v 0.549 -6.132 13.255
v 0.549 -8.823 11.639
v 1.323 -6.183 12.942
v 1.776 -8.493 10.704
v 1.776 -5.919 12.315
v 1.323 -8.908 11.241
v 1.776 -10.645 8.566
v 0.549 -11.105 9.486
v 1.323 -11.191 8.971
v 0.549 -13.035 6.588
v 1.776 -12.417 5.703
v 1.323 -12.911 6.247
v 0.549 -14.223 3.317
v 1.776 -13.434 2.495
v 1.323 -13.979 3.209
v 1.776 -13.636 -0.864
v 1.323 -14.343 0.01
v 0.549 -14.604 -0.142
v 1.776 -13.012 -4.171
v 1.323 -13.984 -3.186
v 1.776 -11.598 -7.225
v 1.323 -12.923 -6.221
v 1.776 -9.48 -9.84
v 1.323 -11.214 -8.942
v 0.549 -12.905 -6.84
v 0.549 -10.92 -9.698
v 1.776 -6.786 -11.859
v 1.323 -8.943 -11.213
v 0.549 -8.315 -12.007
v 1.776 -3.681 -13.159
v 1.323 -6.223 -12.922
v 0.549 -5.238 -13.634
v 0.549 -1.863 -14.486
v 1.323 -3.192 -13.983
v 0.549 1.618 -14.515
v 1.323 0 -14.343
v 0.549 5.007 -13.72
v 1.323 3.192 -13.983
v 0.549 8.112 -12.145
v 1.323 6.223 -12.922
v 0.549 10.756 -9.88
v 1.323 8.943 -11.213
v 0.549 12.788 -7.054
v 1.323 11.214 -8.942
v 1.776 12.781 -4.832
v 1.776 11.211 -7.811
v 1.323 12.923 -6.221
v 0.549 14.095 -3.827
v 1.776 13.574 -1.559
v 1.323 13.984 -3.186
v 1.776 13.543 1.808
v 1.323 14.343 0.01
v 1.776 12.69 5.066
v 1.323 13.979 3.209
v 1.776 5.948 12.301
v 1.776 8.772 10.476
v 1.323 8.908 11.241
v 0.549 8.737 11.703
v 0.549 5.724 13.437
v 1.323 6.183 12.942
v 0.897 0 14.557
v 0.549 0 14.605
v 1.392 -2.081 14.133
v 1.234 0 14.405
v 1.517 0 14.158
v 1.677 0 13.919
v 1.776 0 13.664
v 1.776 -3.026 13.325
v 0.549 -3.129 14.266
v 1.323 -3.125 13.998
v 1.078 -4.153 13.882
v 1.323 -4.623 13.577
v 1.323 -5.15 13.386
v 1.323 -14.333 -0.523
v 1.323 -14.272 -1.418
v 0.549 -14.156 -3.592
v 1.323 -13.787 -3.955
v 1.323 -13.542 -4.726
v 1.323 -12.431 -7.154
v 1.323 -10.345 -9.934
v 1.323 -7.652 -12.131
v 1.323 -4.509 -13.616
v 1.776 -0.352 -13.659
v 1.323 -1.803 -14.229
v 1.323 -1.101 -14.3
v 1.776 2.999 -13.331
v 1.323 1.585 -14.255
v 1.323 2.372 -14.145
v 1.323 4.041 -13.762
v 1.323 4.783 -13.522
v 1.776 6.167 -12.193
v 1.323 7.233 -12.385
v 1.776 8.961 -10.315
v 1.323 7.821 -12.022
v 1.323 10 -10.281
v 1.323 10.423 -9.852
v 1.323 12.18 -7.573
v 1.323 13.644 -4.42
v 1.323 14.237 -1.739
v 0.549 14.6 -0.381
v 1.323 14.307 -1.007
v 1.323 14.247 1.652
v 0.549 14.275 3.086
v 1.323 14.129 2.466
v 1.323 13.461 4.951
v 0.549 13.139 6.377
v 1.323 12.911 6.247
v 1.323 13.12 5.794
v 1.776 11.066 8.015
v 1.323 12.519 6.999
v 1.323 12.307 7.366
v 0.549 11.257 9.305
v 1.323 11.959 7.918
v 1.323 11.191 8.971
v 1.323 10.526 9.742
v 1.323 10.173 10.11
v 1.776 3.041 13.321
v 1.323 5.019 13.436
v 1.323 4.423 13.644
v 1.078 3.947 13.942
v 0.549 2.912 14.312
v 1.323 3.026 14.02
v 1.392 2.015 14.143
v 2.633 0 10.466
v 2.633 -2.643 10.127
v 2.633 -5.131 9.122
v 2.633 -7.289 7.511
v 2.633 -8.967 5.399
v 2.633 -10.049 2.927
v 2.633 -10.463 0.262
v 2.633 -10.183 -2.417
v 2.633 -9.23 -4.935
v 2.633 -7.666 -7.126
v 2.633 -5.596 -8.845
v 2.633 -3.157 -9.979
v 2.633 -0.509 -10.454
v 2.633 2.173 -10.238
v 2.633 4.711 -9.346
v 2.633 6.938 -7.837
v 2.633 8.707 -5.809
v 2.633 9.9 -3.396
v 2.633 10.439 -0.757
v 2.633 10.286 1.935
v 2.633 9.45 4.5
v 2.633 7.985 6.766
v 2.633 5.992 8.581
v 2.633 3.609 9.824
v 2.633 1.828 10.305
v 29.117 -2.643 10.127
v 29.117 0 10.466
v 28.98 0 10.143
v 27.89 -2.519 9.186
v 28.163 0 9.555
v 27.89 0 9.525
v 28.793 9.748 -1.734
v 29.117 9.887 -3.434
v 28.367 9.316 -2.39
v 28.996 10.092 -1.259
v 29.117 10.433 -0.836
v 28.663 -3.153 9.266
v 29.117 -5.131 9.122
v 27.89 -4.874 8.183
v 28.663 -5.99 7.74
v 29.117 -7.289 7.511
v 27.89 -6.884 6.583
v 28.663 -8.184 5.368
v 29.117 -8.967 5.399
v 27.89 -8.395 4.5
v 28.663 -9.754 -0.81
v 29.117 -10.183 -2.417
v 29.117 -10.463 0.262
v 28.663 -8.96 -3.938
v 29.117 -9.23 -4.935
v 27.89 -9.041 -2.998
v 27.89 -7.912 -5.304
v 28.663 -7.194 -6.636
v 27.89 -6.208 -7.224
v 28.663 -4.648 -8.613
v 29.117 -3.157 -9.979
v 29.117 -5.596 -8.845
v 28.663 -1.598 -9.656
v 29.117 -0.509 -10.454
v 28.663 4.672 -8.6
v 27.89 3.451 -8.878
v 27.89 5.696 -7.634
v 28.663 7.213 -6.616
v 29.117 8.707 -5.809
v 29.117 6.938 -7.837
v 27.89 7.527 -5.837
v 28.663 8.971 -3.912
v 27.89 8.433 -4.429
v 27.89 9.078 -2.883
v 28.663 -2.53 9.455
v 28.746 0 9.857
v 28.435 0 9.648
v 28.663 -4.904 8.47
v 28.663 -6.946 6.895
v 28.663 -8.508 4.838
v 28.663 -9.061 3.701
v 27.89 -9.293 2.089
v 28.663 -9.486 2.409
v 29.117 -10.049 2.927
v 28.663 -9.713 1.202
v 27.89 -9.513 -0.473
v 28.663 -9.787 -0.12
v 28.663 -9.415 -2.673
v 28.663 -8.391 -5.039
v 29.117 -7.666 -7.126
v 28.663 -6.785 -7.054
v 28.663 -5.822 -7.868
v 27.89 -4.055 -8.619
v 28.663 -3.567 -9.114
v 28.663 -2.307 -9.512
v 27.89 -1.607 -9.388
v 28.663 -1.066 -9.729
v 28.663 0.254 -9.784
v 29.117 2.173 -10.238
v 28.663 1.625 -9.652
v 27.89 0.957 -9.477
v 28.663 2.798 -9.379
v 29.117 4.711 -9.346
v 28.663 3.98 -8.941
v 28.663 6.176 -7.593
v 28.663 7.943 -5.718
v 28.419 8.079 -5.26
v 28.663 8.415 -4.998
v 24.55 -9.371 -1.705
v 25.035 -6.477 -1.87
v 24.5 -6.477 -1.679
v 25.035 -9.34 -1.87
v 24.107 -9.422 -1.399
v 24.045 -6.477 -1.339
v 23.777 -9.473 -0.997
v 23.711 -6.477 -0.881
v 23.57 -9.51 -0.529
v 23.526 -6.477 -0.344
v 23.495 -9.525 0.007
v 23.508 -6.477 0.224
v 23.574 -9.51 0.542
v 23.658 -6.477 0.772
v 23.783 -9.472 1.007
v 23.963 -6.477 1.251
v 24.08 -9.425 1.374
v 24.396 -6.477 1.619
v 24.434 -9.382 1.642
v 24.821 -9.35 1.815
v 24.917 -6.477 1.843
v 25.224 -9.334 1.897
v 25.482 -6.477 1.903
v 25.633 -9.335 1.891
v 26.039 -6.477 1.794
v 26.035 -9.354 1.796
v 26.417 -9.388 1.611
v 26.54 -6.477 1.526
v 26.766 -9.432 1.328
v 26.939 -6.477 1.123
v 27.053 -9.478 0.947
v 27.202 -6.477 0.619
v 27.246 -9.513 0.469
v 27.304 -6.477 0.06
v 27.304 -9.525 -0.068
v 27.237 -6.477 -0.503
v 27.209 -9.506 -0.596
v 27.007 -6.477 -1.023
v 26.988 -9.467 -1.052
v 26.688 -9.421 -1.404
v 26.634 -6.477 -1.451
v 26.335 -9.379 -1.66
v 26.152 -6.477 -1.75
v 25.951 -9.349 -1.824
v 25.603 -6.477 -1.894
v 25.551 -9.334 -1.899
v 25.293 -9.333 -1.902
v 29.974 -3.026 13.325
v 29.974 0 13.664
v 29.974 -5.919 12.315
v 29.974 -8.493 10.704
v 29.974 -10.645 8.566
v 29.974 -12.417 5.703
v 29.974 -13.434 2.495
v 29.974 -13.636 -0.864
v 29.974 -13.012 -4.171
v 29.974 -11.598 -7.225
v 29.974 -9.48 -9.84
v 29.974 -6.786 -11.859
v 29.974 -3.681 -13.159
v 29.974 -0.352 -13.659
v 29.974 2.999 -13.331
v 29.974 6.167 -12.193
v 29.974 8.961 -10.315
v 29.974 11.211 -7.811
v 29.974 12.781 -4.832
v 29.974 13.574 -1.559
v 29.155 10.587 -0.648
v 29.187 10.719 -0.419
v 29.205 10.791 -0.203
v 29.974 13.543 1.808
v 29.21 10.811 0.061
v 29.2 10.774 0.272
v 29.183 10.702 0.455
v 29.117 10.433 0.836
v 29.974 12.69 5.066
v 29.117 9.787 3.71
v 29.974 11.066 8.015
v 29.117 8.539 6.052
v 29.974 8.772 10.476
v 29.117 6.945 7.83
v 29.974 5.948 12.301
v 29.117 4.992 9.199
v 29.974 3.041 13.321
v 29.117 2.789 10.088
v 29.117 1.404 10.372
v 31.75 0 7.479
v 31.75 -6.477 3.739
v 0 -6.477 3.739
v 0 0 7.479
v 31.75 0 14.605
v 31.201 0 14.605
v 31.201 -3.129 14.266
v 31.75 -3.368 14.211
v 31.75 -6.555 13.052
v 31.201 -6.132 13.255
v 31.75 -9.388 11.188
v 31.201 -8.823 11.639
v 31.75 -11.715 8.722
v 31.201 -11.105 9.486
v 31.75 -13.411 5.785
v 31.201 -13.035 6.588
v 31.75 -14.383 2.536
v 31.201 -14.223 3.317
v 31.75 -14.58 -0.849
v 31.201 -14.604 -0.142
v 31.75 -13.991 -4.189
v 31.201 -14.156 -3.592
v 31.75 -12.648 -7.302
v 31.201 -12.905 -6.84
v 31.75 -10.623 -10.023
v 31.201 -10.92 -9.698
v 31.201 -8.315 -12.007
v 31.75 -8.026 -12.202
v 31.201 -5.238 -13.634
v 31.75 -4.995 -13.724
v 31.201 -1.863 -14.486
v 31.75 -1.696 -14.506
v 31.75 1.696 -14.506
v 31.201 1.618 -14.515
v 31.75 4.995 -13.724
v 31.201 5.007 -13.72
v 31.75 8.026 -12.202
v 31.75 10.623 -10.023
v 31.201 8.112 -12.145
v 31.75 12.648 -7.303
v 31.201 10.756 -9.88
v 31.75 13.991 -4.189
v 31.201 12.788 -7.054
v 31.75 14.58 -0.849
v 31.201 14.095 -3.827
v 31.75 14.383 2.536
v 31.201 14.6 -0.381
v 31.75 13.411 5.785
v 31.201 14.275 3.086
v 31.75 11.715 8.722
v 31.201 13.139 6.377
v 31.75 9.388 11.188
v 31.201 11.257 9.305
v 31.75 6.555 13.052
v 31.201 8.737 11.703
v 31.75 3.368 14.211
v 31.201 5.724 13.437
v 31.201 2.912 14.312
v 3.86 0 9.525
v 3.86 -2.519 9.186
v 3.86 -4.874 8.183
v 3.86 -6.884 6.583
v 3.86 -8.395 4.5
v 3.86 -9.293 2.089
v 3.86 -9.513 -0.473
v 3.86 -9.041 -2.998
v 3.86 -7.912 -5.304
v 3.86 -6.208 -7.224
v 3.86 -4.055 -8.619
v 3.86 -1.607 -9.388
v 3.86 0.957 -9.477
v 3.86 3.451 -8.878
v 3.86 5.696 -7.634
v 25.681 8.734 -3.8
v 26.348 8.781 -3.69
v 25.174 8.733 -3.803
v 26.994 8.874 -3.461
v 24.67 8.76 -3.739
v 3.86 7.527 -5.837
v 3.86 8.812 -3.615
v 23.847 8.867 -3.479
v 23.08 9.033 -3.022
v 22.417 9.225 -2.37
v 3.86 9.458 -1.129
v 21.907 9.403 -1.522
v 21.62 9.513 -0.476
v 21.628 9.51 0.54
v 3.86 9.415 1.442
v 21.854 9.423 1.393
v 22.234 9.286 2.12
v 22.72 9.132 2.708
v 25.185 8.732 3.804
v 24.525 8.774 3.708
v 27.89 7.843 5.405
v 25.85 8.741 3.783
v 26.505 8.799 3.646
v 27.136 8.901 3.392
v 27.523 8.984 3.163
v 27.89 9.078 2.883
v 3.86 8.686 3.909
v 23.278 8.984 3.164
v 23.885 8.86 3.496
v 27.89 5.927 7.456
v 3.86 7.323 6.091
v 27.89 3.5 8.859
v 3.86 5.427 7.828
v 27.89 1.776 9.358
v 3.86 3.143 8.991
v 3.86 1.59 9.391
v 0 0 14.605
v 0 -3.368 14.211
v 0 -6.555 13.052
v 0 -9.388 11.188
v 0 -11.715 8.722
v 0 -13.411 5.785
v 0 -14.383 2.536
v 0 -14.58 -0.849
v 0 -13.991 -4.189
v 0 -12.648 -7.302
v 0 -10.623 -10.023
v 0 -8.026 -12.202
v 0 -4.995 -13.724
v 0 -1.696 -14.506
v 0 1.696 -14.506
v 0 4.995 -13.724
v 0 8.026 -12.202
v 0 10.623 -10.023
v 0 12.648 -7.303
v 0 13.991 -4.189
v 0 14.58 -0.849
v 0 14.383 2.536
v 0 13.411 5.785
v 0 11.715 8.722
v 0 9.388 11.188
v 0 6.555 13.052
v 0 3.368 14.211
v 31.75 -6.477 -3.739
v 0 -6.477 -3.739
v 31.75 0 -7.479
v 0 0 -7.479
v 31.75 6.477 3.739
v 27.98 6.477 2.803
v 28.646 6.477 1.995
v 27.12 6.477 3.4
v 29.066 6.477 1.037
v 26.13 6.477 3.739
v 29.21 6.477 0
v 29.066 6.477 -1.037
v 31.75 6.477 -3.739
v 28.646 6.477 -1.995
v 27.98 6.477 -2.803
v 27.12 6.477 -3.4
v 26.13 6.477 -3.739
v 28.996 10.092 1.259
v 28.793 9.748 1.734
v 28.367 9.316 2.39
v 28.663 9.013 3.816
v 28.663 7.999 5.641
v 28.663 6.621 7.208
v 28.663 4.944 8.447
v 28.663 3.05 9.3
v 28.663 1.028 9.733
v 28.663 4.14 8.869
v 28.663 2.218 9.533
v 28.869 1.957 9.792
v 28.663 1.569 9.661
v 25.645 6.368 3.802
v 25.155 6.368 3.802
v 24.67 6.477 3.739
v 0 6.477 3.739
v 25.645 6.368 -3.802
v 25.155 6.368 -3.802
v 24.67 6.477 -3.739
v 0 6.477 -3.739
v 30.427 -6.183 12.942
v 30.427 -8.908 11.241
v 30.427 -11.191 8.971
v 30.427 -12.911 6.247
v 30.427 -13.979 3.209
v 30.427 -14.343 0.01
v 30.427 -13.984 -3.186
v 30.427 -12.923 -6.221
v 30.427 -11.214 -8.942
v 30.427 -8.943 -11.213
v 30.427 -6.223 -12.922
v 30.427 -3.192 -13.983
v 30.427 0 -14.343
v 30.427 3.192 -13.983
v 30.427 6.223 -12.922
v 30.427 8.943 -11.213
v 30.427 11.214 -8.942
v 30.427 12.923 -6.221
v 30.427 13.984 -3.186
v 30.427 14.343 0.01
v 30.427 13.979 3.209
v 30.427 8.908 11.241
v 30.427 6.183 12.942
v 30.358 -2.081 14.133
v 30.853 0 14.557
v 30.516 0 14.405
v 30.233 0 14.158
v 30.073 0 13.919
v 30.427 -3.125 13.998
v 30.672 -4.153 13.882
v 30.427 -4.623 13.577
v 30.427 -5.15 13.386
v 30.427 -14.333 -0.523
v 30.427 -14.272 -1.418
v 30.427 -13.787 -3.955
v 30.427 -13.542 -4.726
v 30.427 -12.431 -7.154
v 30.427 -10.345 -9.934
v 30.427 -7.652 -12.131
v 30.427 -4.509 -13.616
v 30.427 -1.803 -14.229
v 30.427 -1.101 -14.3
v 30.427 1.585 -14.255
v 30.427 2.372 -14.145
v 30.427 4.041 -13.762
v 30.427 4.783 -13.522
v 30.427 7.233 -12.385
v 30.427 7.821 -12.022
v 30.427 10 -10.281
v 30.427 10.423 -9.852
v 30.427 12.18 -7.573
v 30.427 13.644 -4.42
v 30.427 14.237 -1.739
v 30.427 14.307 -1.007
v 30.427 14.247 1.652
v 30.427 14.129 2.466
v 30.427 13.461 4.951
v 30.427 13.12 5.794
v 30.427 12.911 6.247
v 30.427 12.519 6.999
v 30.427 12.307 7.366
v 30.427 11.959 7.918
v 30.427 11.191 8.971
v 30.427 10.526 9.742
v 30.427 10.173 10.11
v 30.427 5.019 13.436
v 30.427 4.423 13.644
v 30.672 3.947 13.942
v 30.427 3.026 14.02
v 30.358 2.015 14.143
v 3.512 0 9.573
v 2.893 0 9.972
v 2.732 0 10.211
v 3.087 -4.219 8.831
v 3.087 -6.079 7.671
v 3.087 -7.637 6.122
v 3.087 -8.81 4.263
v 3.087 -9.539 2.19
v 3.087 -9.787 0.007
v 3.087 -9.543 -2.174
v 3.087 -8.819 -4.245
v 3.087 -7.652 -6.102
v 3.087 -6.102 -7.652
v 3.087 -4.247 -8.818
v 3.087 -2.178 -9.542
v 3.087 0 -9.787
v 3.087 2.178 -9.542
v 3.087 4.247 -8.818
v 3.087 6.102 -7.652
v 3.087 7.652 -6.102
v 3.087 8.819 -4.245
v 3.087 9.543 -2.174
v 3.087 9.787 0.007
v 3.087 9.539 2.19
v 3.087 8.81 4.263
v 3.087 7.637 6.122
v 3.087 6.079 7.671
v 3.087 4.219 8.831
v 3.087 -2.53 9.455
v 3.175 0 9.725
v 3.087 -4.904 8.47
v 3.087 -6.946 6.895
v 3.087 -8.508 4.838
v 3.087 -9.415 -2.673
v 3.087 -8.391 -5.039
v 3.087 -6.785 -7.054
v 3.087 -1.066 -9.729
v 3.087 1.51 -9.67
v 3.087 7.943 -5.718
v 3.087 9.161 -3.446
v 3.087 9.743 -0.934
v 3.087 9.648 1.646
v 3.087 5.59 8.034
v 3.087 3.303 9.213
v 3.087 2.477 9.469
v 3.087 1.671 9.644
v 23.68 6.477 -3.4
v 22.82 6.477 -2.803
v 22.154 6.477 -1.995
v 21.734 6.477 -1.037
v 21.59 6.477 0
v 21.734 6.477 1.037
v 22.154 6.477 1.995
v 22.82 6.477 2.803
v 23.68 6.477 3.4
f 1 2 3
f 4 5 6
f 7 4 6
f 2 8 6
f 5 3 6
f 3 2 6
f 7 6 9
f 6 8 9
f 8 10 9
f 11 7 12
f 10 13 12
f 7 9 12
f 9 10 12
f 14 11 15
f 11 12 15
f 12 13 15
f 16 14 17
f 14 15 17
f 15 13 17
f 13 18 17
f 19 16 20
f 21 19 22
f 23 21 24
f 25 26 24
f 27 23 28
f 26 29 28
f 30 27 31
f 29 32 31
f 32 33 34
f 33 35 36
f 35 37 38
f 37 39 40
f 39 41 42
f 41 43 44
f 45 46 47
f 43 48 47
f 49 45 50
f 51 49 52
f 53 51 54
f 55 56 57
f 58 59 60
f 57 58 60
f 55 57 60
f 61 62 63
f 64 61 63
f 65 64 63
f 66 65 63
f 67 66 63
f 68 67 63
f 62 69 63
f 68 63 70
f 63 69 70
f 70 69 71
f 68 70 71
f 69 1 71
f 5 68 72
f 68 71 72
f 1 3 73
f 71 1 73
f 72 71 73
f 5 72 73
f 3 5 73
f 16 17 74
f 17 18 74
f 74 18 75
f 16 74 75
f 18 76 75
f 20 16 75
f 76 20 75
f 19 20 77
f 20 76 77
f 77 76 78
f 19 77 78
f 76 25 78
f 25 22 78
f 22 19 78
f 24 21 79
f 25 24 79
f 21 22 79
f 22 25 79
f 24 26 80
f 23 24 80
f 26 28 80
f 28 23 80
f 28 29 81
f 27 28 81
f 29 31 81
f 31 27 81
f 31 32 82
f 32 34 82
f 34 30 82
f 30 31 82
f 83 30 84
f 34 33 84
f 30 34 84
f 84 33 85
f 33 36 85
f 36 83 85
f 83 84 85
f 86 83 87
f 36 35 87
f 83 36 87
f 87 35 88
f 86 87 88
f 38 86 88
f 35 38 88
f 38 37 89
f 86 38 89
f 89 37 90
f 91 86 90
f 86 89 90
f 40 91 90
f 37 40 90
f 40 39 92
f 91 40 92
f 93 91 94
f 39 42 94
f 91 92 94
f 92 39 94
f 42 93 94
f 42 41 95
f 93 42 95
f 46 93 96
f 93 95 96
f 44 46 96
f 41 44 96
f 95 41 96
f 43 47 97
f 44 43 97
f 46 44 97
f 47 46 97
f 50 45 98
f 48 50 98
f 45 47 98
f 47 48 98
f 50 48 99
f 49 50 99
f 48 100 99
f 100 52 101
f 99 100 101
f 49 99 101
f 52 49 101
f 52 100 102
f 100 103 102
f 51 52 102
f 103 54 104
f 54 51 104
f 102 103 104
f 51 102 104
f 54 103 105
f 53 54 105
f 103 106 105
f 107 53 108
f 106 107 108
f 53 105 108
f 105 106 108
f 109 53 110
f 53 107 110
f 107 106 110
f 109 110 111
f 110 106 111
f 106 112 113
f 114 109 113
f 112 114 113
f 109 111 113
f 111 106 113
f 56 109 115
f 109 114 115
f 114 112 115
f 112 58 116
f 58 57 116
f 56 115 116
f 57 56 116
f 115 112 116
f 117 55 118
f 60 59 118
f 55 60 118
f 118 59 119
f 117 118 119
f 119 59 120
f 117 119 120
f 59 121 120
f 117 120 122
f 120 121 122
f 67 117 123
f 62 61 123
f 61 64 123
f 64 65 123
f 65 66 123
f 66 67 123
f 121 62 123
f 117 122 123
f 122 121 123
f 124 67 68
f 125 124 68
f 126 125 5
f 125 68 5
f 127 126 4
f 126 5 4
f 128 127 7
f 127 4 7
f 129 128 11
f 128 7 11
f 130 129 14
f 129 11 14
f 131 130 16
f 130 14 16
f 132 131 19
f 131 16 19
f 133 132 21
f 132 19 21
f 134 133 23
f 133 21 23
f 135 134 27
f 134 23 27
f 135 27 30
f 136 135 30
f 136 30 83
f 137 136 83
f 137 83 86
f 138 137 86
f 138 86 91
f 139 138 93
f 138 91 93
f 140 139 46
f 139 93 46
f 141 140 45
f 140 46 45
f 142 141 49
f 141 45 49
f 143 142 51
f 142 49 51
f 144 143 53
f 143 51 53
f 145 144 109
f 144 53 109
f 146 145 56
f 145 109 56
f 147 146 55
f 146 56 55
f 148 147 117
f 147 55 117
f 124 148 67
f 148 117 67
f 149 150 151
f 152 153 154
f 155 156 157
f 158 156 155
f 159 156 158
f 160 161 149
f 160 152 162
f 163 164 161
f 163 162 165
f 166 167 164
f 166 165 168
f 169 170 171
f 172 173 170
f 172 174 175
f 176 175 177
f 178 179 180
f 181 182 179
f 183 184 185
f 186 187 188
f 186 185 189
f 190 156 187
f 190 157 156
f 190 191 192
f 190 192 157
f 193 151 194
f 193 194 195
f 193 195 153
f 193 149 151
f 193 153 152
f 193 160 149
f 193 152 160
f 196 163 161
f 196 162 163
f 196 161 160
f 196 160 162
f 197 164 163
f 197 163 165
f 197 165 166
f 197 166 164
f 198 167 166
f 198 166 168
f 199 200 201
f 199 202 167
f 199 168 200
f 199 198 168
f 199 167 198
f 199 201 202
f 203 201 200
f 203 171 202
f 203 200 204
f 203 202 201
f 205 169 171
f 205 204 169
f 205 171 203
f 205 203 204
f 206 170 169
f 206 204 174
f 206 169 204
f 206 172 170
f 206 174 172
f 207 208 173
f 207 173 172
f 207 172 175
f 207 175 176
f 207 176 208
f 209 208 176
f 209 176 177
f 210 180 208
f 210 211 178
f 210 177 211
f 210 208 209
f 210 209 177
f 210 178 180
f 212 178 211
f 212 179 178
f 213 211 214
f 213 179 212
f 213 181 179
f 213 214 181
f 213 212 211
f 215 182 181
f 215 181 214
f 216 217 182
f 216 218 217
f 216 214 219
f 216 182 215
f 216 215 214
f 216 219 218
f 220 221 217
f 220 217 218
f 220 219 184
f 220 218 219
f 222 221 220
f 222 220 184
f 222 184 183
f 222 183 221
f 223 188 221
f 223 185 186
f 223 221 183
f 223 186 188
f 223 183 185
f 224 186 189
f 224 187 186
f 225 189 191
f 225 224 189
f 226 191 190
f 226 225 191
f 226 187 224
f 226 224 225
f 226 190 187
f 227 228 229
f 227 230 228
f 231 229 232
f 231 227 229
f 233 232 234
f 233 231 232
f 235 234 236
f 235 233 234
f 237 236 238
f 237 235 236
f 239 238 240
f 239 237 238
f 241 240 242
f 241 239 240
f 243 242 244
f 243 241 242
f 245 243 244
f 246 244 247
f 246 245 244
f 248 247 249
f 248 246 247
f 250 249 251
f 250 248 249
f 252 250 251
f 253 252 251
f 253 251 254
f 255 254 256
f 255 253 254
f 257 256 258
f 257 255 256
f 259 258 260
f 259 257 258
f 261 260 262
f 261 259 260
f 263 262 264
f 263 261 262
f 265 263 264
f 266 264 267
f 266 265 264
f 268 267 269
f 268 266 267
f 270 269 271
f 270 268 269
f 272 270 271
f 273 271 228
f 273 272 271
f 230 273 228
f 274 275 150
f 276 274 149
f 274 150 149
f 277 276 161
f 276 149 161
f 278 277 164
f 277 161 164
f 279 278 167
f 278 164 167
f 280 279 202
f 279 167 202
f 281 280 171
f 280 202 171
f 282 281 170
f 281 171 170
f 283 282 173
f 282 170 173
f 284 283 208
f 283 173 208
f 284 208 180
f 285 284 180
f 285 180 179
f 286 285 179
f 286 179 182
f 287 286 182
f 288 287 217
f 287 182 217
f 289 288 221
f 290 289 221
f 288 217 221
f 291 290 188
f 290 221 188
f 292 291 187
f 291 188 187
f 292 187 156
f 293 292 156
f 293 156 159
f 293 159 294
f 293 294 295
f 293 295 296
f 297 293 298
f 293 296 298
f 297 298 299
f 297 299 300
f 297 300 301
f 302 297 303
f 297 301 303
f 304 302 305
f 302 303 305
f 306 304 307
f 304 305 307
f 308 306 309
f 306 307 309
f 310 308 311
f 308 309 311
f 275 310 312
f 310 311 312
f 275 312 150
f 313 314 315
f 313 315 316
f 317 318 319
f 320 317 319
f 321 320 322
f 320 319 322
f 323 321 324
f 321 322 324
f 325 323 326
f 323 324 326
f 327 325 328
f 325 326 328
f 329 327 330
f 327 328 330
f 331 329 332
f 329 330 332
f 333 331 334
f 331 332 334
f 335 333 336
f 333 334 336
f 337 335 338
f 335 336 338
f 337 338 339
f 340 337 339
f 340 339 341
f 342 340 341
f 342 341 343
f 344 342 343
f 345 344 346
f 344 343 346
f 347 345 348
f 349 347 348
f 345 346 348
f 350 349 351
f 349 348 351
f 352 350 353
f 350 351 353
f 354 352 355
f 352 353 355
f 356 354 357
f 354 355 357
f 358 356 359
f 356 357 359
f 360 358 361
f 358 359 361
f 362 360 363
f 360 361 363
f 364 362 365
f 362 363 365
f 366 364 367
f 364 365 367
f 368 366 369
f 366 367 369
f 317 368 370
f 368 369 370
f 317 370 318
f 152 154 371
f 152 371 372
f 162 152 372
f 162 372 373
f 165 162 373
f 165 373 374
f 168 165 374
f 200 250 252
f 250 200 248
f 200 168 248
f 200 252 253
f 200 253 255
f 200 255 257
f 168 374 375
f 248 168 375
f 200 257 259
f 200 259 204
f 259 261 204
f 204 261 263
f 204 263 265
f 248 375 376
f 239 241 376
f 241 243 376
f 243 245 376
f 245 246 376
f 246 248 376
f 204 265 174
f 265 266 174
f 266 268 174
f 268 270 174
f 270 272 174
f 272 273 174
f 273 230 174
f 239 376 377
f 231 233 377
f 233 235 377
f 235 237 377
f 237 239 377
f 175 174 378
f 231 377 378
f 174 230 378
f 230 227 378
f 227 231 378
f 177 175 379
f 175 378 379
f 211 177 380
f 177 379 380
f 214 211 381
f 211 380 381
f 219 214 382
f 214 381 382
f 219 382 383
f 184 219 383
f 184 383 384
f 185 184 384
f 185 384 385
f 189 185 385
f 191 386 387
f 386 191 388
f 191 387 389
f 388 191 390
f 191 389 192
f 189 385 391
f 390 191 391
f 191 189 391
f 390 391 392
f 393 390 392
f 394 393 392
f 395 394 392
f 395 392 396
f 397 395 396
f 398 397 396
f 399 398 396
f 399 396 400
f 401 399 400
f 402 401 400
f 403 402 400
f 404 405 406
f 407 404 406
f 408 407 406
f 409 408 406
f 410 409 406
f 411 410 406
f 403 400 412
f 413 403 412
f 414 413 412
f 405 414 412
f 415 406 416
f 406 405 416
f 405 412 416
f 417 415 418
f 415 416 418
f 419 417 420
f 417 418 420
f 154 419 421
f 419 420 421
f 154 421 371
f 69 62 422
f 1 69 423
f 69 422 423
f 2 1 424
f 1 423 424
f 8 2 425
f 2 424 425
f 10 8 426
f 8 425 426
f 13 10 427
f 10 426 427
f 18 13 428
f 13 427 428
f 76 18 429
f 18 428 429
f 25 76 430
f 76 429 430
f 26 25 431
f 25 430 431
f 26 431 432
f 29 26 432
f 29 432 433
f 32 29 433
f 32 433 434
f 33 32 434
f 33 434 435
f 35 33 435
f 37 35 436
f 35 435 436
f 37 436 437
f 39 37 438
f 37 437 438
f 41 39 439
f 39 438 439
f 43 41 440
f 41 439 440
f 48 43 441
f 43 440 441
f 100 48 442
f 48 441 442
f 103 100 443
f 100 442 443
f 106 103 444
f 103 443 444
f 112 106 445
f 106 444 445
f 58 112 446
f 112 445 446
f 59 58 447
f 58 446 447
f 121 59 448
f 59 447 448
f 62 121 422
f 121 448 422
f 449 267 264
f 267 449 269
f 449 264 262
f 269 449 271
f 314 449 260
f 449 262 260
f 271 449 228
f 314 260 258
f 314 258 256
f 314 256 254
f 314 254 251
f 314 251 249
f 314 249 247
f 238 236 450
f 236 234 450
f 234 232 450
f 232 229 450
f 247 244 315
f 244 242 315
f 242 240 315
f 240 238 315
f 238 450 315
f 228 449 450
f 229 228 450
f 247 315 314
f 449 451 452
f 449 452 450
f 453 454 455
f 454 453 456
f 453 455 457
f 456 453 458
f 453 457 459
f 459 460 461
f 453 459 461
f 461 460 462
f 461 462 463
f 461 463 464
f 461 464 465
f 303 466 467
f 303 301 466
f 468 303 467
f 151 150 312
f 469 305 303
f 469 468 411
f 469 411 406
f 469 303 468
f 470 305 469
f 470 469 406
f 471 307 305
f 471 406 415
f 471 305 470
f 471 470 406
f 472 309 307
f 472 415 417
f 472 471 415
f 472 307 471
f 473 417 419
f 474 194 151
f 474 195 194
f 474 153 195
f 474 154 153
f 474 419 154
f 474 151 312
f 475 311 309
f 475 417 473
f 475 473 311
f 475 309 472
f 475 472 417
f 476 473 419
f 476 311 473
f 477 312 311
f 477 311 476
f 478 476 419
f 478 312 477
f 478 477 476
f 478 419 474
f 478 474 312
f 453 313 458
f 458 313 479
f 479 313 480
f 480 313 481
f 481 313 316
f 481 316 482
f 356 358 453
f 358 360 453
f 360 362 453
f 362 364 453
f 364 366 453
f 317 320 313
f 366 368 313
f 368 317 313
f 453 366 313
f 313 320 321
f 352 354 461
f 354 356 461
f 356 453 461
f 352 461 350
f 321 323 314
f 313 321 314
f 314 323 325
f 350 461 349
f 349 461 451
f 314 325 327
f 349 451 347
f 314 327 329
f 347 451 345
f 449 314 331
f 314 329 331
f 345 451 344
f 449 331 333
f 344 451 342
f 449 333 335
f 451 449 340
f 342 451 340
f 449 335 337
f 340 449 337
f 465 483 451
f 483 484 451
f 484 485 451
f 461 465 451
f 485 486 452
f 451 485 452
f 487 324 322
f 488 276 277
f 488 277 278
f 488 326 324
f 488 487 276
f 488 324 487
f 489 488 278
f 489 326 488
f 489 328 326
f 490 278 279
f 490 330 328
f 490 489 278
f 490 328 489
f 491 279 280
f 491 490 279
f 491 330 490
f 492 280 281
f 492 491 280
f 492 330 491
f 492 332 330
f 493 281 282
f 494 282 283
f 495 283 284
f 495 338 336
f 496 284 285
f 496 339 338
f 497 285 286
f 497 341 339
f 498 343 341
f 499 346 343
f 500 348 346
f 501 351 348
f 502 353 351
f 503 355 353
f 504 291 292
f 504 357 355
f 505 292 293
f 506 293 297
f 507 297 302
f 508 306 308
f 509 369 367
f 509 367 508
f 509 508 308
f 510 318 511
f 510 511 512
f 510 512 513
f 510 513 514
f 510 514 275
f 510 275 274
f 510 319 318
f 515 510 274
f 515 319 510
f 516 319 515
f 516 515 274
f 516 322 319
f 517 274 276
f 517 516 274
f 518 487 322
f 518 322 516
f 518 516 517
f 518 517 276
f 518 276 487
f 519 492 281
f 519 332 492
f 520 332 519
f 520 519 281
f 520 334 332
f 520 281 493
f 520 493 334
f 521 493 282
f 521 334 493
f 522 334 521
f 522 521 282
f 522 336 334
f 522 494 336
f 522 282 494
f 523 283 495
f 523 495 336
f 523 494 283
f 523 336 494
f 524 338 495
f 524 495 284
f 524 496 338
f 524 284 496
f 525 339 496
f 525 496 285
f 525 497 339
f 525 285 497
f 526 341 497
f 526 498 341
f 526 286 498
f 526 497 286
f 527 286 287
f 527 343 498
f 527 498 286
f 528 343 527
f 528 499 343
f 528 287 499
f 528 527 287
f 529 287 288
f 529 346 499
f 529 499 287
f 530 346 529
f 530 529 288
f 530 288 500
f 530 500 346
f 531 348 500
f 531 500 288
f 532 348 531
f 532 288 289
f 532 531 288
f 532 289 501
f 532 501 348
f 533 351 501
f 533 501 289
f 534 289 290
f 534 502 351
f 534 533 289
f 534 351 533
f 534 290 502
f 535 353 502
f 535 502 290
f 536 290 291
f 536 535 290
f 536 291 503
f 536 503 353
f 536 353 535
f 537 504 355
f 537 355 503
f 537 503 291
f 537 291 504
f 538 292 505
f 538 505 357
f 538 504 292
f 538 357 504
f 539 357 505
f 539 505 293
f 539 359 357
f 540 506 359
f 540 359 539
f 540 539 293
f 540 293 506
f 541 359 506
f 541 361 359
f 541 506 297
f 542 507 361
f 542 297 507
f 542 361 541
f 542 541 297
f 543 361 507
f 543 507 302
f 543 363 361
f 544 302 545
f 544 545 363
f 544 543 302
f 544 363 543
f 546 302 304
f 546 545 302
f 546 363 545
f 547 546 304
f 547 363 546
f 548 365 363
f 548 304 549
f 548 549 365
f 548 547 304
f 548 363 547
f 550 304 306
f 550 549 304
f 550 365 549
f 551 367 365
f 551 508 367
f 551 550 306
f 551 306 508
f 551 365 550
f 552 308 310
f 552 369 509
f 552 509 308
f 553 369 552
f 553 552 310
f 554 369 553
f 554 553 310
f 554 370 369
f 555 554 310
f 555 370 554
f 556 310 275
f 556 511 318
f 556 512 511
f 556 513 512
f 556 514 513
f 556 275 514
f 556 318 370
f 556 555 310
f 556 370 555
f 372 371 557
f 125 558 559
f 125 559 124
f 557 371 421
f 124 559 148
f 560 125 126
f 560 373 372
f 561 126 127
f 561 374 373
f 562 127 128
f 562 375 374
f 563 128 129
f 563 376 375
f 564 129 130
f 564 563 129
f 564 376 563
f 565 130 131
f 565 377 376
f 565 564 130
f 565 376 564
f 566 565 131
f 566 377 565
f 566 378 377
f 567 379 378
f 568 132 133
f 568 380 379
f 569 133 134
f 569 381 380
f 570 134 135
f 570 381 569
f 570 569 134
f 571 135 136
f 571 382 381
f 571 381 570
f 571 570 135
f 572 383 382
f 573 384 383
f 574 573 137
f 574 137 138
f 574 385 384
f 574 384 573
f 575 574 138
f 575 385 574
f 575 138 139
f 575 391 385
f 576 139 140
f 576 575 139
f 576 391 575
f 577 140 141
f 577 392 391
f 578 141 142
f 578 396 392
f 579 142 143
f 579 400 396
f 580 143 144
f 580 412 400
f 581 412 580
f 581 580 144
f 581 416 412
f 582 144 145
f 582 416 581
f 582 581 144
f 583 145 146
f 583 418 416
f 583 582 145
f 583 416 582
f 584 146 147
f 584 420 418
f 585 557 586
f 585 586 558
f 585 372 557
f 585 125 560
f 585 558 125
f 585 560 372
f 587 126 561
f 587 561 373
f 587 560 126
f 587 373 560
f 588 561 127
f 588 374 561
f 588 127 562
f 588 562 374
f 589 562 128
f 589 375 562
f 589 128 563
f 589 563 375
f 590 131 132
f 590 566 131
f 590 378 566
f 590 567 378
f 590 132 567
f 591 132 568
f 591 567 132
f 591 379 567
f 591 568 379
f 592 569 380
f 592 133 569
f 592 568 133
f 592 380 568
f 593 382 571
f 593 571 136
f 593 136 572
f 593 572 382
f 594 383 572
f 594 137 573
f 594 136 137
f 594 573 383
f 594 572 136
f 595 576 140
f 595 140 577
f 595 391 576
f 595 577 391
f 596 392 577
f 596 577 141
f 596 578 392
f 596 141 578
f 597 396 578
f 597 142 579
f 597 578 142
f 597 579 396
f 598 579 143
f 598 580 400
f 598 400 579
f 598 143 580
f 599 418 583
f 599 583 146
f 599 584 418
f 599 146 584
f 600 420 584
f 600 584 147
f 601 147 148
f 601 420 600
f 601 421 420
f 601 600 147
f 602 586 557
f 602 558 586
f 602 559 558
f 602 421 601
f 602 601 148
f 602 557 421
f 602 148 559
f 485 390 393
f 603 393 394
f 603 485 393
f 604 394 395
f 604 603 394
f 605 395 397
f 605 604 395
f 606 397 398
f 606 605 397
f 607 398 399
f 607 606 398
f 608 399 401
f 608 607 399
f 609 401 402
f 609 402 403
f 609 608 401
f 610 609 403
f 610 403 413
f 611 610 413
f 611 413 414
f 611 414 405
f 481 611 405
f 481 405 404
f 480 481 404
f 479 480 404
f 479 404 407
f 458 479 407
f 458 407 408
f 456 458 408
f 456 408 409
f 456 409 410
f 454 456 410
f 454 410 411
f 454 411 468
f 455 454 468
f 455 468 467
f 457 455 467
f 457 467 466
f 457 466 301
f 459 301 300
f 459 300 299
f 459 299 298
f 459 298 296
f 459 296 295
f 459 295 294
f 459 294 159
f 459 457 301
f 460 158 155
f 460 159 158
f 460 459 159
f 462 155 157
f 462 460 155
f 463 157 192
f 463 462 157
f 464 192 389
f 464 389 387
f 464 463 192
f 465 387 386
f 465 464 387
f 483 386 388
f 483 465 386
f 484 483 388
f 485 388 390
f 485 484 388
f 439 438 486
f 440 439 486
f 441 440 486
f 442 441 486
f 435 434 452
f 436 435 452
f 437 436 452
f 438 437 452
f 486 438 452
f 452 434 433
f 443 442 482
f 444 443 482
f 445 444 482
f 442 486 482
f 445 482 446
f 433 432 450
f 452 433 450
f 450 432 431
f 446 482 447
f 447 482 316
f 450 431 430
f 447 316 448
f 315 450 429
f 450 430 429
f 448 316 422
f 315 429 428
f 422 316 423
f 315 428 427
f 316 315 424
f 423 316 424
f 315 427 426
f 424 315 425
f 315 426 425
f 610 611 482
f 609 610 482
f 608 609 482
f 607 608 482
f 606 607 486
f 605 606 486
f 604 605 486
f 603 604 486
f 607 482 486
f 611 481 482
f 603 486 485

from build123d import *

# Parameters (mm, degrees)
CUT_EXTRUDE1_DEPTH = 38.877097962
FILLET1_R          = 1.27


with BuildPart() as part:
    # Sketch1 → Revolve1 (revolve)
    with BuildSketch(Plane.XY, mode=Mode.PRIVATE) as revolve1_sk:
        Polygon((0, 0), (31.75, 0), (31.75, 14.605), (30.226, 14.605), (28.864818102, 9.525), (2.885181898, 9.525), (1.524, 14.605), (0, 14.605), align=None)
    revolve(revolve1_sk.sketch.rotate(Axis((31.75, 0, 0), (1, 0, 0)), 90), axis=Axis((31.75, 0, 0), (1, 0, 0)))

    # Sketch2 → Cut-Extrude1 (cut, through all)
    with BuildSketch(Plane.ZY):
        Polygon((7.478995387, 0), (3.739497694, 6.477), (-3.739497694, 6.477), (-7.478995387, 0), (-3.739497694, -6.477), (3.739497694, -6.477), align=None)
    extrude(amount=-CUT_EXTRUDE1_DEPTH, mode=Mode.SUBTRACT)

    # Fillet1
    fillet1_edges = [part.edges().sort_by_distance(p)[0] for p in [
        (1.524, 0, -14.605),
        (2.885181898, 0, -9.525),
        (28.864818102, 0, -9.525),
        (30.226, 0, -14.605),
    ]]
    fillet(fillet1_edges, radius=FILLET1_R)

    # Sketch3 → Cut-Revolve1 (revolve, cut)
    with BuildSketch(Plane.XY, mode=Mode.PRIVATE) as cut_revolve1_sk:
        Polygon((27.305, -14.605), (25.4, -14.605), (25.4, 14.605), (29.21, 14.605), (29.21, -0.025313637), (27.305, -0.025313637), align=None)
    revolve(cut_revolve1_sk.sketch.rotate(Axis((25.4, 14.605, 0), (0, 1, 0)), 101.039484404), axis=Axis((25.4, 14.605, 0), (0, 1, 0)), mode=Mode.SUBTRACT)


solid = part.part
